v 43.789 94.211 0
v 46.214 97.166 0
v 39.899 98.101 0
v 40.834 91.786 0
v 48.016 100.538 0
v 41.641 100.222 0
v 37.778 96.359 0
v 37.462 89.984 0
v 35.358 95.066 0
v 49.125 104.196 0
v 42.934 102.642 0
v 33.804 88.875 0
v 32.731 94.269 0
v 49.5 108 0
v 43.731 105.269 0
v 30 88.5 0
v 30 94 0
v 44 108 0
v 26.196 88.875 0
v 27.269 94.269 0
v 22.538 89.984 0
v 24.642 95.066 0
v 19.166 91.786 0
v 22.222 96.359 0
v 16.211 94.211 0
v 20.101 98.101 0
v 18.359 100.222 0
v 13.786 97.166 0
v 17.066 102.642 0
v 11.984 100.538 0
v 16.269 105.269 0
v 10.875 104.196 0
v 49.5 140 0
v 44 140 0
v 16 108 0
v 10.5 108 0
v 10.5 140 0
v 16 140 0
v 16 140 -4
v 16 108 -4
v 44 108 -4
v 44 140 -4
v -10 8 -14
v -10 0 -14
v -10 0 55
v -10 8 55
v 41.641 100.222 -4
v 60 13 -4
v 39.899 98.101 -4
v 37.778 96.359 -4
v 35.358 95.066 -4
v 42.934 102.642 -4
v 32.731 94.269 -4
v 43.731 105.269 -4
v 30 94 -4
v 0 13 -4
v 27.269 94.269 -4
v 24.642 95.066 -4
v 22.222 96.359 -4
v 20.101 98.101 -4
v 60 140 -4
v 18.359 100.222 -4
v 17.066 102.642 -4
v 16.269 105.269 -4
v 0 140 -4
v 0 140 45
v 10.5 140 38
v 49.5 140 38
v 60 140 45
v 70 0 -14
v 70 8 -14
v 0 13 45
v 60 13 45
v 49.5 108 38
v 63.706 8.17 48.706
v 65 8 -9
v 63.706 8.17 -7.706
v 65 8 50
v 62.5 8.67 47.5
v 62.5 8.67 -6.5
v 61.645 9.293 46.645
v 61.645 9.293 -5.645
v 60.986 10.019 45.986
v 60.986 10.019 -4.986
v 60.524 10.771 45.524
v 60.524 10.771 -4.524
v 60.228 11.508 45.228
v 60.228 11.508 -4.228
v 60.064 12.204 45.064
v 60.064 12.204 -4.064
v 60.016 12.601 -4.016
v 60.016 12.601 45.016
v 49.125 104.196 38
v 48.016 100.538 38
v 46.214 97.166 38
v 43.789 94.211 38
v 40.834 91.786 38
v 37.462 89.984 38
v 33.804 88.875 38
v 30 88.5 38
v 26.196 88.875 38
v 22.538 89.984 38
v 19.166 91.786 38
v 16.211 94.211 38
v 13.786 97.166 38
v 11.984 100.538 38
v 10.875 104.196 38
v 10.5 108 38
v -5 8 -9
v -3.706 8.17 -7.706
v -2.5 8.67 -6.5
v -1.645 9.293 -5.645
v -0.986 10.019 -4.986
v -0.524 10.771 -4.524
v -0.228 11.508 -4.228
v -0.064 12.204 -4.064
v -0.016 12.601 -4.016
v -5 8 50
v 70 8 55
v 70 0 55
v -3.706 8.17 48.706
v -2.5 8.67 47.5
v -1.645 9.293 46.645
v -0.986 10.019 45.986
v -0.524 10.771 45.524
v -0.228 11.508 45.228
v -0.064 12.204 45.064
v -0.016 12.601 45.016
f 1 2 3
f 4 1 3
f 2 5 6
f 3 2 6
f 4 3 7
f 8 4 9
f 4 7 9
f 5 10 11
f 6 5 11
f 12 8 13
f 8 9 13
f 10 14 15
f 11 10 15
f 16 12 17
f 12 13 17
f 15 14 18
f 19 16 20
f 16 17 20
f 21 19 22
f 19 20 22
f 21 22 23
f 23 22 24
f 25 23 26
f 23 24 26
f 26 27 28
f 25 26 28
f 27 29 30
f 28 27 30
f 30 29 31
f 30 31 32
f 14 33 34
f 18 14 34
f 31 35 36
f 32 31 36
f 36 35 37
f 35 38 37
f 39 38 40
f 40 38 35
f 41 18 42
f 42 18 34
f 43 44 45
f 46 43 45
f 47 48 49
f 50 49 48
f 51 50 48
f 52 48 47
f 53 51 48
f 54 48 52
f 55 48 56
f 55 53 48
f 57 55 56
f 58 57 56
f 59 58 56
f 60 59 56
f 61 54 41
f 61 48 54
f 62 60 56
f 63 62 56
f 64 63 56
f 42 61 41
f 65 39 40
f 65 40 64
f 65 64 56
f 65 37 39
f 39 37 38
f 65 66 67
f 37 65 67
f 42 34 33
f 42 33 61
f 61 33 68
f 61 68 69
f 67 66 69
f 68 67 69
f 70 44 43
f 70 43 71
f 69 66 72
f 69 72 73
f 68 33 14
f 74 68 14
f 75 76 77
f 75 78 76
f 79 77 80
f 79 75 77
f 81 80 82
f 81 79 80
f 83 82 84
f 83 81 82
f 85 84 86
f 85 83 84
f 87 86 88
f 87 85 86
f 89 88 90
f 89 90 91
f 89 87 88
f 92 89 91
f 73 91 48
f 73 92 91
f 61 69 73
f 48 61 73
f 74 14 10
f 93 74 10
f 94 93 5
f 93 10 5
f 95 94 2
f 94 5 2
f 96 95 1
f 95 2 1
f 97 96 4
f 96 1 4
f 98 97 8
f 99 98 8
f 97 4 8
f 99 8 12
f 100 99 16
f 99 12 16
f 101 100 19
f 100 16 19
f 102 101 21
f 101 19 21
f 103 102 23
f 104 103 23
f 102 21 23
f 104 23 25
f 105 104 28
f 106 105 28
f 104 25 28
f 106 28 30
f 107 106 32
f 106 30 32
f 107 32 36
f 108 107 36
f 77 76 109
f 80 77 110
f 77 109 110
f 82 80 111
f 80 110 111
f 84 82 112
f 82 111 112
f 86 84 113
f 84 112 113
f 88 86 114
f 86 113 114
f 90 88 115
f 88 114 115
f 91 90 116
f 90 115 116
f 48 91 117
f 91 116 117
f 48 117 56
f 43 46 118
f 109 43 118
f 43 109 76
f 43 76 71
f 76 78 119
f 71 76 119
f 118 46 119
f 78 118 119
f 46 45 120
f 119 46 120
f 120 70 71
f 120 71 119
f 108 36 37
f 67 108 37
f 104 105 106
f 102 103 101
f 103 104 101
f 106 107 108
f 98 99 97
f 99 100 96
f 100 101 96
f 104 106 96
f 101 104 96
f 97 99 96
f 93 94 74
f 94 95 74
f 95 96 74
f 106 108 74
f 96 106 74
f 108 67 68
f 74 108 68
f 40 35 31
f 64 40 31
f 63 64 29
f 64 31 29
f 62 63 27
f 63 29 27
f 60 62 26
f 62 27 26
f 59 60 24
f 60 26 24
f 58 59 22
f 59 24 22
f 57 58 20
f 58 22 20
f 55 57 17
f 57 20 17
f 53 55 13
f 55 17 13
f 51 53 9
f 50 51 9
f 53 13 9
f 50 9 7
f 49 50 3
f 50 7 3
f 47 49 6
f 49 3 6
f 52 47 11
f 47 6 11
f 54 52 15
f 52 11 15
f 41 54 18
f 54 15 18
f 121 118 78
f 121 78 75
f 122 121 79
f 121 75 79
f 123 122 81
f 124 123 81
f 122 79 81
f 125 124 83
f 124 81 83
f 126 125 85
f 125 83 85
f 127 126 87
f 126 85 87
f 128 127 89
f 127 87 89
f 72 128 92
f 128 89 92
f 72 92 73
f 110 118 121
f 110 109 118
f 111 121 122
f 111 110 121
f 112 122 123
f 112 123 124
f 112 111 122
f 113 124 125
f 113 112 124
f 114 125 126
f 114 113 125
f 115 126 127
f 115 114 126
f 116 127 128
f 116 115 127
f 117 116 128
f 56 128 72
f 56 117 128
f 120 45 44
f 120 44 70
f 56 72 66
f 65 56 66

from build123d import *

# Parameters (mm, degrees)
BOSS_EXTRUDE1_DEPTH = 38
SKETCH3_W           = 60
SKETCH3_H           = 140
BOSS_EXTRUDE2_DEPTH = 7
BOSS_EXTRUDE3_DEPTH = 4
SKETCH5_W           = 80
SKETCH5_H           = 69
BOSS_EXTRUDE4_DEPTH = 8
FILLET1_R           = 5


with BuildPart() as part:
    # Sketch2 → Boss-Extrude1 (new body)
    with BuildSketch(Plane.XY):
        with BuildLine():
            Line((10.5, 108), (10.5, 140))
            Line((10.5, 140), (0, 140))
            Line((0, 140), (0, 0))
            Line((0, 0), (60, 0))
            Line((60, 0), (60, 140))
            Line((60, 140), (49.5, 140))
            Line((49.5, 140), (49.5, 108))
            ThreePointArc((49.5, 108), (30, 88.5), (10.5, 108))
        make_face()
    extrude(amount=BOSS_EXTRUDE1_DEPTH)

    # Sketch3 → Boss-Extrude2 (add)
    with BuildSketch(Plane.XY.offset(38)):
        with Locations((30, 70)):
            Rectangle(SKETCH3_W, SKETCH3_H)
    extrude(amount=BOSS_EXTRUDE2_DEPTH)

    # Sketch4 → Boss-Extrude3 (add)
    with BuildSketch(Plane(origin=(0, 0, 0), x_dir=(-1, 0, 0), z_dir=(0, 0, -1))):
        with BuildLine():
            Line((-44, 108), (-44, 140))
            Line((-44, 140), (-60, 140))
            Line((-60, 140), (-60, 0))
            Line((-60, 0), (0, 0))
            Line((0, 0), (0, 140))
            Line((0, 140), (-16, 140))
            Line((-16, 140), (-16, 108))
            ThreePointArc((-16, 108), (-30, 94), (-44, 108))
        make_face()
    extrude(amount=BOSS_EXTRUDE3_DEPTH)

    # Sketch5 → Boss-Extrude4 (add)
    with BuildSketch(Plane.XZ):
        with Locations((30, 20.5)):
            Rectangle(SKETCH5_W, SKETCH5_H)
    extrude(amount=-BOSS_EXTRUDE4_DEPTH)

    # Fillet1
    fillet1_edges = [part.edges().sort_by_distance(p)[0] for p in [
        (30, 8, -4),
        (30, 8, 45),
        (0, 8, 20.5),
        (60, 8, 20.5),
    ]]
    fillet(fillet1_edges, radius=FILLET1_R)


solid = part.part
